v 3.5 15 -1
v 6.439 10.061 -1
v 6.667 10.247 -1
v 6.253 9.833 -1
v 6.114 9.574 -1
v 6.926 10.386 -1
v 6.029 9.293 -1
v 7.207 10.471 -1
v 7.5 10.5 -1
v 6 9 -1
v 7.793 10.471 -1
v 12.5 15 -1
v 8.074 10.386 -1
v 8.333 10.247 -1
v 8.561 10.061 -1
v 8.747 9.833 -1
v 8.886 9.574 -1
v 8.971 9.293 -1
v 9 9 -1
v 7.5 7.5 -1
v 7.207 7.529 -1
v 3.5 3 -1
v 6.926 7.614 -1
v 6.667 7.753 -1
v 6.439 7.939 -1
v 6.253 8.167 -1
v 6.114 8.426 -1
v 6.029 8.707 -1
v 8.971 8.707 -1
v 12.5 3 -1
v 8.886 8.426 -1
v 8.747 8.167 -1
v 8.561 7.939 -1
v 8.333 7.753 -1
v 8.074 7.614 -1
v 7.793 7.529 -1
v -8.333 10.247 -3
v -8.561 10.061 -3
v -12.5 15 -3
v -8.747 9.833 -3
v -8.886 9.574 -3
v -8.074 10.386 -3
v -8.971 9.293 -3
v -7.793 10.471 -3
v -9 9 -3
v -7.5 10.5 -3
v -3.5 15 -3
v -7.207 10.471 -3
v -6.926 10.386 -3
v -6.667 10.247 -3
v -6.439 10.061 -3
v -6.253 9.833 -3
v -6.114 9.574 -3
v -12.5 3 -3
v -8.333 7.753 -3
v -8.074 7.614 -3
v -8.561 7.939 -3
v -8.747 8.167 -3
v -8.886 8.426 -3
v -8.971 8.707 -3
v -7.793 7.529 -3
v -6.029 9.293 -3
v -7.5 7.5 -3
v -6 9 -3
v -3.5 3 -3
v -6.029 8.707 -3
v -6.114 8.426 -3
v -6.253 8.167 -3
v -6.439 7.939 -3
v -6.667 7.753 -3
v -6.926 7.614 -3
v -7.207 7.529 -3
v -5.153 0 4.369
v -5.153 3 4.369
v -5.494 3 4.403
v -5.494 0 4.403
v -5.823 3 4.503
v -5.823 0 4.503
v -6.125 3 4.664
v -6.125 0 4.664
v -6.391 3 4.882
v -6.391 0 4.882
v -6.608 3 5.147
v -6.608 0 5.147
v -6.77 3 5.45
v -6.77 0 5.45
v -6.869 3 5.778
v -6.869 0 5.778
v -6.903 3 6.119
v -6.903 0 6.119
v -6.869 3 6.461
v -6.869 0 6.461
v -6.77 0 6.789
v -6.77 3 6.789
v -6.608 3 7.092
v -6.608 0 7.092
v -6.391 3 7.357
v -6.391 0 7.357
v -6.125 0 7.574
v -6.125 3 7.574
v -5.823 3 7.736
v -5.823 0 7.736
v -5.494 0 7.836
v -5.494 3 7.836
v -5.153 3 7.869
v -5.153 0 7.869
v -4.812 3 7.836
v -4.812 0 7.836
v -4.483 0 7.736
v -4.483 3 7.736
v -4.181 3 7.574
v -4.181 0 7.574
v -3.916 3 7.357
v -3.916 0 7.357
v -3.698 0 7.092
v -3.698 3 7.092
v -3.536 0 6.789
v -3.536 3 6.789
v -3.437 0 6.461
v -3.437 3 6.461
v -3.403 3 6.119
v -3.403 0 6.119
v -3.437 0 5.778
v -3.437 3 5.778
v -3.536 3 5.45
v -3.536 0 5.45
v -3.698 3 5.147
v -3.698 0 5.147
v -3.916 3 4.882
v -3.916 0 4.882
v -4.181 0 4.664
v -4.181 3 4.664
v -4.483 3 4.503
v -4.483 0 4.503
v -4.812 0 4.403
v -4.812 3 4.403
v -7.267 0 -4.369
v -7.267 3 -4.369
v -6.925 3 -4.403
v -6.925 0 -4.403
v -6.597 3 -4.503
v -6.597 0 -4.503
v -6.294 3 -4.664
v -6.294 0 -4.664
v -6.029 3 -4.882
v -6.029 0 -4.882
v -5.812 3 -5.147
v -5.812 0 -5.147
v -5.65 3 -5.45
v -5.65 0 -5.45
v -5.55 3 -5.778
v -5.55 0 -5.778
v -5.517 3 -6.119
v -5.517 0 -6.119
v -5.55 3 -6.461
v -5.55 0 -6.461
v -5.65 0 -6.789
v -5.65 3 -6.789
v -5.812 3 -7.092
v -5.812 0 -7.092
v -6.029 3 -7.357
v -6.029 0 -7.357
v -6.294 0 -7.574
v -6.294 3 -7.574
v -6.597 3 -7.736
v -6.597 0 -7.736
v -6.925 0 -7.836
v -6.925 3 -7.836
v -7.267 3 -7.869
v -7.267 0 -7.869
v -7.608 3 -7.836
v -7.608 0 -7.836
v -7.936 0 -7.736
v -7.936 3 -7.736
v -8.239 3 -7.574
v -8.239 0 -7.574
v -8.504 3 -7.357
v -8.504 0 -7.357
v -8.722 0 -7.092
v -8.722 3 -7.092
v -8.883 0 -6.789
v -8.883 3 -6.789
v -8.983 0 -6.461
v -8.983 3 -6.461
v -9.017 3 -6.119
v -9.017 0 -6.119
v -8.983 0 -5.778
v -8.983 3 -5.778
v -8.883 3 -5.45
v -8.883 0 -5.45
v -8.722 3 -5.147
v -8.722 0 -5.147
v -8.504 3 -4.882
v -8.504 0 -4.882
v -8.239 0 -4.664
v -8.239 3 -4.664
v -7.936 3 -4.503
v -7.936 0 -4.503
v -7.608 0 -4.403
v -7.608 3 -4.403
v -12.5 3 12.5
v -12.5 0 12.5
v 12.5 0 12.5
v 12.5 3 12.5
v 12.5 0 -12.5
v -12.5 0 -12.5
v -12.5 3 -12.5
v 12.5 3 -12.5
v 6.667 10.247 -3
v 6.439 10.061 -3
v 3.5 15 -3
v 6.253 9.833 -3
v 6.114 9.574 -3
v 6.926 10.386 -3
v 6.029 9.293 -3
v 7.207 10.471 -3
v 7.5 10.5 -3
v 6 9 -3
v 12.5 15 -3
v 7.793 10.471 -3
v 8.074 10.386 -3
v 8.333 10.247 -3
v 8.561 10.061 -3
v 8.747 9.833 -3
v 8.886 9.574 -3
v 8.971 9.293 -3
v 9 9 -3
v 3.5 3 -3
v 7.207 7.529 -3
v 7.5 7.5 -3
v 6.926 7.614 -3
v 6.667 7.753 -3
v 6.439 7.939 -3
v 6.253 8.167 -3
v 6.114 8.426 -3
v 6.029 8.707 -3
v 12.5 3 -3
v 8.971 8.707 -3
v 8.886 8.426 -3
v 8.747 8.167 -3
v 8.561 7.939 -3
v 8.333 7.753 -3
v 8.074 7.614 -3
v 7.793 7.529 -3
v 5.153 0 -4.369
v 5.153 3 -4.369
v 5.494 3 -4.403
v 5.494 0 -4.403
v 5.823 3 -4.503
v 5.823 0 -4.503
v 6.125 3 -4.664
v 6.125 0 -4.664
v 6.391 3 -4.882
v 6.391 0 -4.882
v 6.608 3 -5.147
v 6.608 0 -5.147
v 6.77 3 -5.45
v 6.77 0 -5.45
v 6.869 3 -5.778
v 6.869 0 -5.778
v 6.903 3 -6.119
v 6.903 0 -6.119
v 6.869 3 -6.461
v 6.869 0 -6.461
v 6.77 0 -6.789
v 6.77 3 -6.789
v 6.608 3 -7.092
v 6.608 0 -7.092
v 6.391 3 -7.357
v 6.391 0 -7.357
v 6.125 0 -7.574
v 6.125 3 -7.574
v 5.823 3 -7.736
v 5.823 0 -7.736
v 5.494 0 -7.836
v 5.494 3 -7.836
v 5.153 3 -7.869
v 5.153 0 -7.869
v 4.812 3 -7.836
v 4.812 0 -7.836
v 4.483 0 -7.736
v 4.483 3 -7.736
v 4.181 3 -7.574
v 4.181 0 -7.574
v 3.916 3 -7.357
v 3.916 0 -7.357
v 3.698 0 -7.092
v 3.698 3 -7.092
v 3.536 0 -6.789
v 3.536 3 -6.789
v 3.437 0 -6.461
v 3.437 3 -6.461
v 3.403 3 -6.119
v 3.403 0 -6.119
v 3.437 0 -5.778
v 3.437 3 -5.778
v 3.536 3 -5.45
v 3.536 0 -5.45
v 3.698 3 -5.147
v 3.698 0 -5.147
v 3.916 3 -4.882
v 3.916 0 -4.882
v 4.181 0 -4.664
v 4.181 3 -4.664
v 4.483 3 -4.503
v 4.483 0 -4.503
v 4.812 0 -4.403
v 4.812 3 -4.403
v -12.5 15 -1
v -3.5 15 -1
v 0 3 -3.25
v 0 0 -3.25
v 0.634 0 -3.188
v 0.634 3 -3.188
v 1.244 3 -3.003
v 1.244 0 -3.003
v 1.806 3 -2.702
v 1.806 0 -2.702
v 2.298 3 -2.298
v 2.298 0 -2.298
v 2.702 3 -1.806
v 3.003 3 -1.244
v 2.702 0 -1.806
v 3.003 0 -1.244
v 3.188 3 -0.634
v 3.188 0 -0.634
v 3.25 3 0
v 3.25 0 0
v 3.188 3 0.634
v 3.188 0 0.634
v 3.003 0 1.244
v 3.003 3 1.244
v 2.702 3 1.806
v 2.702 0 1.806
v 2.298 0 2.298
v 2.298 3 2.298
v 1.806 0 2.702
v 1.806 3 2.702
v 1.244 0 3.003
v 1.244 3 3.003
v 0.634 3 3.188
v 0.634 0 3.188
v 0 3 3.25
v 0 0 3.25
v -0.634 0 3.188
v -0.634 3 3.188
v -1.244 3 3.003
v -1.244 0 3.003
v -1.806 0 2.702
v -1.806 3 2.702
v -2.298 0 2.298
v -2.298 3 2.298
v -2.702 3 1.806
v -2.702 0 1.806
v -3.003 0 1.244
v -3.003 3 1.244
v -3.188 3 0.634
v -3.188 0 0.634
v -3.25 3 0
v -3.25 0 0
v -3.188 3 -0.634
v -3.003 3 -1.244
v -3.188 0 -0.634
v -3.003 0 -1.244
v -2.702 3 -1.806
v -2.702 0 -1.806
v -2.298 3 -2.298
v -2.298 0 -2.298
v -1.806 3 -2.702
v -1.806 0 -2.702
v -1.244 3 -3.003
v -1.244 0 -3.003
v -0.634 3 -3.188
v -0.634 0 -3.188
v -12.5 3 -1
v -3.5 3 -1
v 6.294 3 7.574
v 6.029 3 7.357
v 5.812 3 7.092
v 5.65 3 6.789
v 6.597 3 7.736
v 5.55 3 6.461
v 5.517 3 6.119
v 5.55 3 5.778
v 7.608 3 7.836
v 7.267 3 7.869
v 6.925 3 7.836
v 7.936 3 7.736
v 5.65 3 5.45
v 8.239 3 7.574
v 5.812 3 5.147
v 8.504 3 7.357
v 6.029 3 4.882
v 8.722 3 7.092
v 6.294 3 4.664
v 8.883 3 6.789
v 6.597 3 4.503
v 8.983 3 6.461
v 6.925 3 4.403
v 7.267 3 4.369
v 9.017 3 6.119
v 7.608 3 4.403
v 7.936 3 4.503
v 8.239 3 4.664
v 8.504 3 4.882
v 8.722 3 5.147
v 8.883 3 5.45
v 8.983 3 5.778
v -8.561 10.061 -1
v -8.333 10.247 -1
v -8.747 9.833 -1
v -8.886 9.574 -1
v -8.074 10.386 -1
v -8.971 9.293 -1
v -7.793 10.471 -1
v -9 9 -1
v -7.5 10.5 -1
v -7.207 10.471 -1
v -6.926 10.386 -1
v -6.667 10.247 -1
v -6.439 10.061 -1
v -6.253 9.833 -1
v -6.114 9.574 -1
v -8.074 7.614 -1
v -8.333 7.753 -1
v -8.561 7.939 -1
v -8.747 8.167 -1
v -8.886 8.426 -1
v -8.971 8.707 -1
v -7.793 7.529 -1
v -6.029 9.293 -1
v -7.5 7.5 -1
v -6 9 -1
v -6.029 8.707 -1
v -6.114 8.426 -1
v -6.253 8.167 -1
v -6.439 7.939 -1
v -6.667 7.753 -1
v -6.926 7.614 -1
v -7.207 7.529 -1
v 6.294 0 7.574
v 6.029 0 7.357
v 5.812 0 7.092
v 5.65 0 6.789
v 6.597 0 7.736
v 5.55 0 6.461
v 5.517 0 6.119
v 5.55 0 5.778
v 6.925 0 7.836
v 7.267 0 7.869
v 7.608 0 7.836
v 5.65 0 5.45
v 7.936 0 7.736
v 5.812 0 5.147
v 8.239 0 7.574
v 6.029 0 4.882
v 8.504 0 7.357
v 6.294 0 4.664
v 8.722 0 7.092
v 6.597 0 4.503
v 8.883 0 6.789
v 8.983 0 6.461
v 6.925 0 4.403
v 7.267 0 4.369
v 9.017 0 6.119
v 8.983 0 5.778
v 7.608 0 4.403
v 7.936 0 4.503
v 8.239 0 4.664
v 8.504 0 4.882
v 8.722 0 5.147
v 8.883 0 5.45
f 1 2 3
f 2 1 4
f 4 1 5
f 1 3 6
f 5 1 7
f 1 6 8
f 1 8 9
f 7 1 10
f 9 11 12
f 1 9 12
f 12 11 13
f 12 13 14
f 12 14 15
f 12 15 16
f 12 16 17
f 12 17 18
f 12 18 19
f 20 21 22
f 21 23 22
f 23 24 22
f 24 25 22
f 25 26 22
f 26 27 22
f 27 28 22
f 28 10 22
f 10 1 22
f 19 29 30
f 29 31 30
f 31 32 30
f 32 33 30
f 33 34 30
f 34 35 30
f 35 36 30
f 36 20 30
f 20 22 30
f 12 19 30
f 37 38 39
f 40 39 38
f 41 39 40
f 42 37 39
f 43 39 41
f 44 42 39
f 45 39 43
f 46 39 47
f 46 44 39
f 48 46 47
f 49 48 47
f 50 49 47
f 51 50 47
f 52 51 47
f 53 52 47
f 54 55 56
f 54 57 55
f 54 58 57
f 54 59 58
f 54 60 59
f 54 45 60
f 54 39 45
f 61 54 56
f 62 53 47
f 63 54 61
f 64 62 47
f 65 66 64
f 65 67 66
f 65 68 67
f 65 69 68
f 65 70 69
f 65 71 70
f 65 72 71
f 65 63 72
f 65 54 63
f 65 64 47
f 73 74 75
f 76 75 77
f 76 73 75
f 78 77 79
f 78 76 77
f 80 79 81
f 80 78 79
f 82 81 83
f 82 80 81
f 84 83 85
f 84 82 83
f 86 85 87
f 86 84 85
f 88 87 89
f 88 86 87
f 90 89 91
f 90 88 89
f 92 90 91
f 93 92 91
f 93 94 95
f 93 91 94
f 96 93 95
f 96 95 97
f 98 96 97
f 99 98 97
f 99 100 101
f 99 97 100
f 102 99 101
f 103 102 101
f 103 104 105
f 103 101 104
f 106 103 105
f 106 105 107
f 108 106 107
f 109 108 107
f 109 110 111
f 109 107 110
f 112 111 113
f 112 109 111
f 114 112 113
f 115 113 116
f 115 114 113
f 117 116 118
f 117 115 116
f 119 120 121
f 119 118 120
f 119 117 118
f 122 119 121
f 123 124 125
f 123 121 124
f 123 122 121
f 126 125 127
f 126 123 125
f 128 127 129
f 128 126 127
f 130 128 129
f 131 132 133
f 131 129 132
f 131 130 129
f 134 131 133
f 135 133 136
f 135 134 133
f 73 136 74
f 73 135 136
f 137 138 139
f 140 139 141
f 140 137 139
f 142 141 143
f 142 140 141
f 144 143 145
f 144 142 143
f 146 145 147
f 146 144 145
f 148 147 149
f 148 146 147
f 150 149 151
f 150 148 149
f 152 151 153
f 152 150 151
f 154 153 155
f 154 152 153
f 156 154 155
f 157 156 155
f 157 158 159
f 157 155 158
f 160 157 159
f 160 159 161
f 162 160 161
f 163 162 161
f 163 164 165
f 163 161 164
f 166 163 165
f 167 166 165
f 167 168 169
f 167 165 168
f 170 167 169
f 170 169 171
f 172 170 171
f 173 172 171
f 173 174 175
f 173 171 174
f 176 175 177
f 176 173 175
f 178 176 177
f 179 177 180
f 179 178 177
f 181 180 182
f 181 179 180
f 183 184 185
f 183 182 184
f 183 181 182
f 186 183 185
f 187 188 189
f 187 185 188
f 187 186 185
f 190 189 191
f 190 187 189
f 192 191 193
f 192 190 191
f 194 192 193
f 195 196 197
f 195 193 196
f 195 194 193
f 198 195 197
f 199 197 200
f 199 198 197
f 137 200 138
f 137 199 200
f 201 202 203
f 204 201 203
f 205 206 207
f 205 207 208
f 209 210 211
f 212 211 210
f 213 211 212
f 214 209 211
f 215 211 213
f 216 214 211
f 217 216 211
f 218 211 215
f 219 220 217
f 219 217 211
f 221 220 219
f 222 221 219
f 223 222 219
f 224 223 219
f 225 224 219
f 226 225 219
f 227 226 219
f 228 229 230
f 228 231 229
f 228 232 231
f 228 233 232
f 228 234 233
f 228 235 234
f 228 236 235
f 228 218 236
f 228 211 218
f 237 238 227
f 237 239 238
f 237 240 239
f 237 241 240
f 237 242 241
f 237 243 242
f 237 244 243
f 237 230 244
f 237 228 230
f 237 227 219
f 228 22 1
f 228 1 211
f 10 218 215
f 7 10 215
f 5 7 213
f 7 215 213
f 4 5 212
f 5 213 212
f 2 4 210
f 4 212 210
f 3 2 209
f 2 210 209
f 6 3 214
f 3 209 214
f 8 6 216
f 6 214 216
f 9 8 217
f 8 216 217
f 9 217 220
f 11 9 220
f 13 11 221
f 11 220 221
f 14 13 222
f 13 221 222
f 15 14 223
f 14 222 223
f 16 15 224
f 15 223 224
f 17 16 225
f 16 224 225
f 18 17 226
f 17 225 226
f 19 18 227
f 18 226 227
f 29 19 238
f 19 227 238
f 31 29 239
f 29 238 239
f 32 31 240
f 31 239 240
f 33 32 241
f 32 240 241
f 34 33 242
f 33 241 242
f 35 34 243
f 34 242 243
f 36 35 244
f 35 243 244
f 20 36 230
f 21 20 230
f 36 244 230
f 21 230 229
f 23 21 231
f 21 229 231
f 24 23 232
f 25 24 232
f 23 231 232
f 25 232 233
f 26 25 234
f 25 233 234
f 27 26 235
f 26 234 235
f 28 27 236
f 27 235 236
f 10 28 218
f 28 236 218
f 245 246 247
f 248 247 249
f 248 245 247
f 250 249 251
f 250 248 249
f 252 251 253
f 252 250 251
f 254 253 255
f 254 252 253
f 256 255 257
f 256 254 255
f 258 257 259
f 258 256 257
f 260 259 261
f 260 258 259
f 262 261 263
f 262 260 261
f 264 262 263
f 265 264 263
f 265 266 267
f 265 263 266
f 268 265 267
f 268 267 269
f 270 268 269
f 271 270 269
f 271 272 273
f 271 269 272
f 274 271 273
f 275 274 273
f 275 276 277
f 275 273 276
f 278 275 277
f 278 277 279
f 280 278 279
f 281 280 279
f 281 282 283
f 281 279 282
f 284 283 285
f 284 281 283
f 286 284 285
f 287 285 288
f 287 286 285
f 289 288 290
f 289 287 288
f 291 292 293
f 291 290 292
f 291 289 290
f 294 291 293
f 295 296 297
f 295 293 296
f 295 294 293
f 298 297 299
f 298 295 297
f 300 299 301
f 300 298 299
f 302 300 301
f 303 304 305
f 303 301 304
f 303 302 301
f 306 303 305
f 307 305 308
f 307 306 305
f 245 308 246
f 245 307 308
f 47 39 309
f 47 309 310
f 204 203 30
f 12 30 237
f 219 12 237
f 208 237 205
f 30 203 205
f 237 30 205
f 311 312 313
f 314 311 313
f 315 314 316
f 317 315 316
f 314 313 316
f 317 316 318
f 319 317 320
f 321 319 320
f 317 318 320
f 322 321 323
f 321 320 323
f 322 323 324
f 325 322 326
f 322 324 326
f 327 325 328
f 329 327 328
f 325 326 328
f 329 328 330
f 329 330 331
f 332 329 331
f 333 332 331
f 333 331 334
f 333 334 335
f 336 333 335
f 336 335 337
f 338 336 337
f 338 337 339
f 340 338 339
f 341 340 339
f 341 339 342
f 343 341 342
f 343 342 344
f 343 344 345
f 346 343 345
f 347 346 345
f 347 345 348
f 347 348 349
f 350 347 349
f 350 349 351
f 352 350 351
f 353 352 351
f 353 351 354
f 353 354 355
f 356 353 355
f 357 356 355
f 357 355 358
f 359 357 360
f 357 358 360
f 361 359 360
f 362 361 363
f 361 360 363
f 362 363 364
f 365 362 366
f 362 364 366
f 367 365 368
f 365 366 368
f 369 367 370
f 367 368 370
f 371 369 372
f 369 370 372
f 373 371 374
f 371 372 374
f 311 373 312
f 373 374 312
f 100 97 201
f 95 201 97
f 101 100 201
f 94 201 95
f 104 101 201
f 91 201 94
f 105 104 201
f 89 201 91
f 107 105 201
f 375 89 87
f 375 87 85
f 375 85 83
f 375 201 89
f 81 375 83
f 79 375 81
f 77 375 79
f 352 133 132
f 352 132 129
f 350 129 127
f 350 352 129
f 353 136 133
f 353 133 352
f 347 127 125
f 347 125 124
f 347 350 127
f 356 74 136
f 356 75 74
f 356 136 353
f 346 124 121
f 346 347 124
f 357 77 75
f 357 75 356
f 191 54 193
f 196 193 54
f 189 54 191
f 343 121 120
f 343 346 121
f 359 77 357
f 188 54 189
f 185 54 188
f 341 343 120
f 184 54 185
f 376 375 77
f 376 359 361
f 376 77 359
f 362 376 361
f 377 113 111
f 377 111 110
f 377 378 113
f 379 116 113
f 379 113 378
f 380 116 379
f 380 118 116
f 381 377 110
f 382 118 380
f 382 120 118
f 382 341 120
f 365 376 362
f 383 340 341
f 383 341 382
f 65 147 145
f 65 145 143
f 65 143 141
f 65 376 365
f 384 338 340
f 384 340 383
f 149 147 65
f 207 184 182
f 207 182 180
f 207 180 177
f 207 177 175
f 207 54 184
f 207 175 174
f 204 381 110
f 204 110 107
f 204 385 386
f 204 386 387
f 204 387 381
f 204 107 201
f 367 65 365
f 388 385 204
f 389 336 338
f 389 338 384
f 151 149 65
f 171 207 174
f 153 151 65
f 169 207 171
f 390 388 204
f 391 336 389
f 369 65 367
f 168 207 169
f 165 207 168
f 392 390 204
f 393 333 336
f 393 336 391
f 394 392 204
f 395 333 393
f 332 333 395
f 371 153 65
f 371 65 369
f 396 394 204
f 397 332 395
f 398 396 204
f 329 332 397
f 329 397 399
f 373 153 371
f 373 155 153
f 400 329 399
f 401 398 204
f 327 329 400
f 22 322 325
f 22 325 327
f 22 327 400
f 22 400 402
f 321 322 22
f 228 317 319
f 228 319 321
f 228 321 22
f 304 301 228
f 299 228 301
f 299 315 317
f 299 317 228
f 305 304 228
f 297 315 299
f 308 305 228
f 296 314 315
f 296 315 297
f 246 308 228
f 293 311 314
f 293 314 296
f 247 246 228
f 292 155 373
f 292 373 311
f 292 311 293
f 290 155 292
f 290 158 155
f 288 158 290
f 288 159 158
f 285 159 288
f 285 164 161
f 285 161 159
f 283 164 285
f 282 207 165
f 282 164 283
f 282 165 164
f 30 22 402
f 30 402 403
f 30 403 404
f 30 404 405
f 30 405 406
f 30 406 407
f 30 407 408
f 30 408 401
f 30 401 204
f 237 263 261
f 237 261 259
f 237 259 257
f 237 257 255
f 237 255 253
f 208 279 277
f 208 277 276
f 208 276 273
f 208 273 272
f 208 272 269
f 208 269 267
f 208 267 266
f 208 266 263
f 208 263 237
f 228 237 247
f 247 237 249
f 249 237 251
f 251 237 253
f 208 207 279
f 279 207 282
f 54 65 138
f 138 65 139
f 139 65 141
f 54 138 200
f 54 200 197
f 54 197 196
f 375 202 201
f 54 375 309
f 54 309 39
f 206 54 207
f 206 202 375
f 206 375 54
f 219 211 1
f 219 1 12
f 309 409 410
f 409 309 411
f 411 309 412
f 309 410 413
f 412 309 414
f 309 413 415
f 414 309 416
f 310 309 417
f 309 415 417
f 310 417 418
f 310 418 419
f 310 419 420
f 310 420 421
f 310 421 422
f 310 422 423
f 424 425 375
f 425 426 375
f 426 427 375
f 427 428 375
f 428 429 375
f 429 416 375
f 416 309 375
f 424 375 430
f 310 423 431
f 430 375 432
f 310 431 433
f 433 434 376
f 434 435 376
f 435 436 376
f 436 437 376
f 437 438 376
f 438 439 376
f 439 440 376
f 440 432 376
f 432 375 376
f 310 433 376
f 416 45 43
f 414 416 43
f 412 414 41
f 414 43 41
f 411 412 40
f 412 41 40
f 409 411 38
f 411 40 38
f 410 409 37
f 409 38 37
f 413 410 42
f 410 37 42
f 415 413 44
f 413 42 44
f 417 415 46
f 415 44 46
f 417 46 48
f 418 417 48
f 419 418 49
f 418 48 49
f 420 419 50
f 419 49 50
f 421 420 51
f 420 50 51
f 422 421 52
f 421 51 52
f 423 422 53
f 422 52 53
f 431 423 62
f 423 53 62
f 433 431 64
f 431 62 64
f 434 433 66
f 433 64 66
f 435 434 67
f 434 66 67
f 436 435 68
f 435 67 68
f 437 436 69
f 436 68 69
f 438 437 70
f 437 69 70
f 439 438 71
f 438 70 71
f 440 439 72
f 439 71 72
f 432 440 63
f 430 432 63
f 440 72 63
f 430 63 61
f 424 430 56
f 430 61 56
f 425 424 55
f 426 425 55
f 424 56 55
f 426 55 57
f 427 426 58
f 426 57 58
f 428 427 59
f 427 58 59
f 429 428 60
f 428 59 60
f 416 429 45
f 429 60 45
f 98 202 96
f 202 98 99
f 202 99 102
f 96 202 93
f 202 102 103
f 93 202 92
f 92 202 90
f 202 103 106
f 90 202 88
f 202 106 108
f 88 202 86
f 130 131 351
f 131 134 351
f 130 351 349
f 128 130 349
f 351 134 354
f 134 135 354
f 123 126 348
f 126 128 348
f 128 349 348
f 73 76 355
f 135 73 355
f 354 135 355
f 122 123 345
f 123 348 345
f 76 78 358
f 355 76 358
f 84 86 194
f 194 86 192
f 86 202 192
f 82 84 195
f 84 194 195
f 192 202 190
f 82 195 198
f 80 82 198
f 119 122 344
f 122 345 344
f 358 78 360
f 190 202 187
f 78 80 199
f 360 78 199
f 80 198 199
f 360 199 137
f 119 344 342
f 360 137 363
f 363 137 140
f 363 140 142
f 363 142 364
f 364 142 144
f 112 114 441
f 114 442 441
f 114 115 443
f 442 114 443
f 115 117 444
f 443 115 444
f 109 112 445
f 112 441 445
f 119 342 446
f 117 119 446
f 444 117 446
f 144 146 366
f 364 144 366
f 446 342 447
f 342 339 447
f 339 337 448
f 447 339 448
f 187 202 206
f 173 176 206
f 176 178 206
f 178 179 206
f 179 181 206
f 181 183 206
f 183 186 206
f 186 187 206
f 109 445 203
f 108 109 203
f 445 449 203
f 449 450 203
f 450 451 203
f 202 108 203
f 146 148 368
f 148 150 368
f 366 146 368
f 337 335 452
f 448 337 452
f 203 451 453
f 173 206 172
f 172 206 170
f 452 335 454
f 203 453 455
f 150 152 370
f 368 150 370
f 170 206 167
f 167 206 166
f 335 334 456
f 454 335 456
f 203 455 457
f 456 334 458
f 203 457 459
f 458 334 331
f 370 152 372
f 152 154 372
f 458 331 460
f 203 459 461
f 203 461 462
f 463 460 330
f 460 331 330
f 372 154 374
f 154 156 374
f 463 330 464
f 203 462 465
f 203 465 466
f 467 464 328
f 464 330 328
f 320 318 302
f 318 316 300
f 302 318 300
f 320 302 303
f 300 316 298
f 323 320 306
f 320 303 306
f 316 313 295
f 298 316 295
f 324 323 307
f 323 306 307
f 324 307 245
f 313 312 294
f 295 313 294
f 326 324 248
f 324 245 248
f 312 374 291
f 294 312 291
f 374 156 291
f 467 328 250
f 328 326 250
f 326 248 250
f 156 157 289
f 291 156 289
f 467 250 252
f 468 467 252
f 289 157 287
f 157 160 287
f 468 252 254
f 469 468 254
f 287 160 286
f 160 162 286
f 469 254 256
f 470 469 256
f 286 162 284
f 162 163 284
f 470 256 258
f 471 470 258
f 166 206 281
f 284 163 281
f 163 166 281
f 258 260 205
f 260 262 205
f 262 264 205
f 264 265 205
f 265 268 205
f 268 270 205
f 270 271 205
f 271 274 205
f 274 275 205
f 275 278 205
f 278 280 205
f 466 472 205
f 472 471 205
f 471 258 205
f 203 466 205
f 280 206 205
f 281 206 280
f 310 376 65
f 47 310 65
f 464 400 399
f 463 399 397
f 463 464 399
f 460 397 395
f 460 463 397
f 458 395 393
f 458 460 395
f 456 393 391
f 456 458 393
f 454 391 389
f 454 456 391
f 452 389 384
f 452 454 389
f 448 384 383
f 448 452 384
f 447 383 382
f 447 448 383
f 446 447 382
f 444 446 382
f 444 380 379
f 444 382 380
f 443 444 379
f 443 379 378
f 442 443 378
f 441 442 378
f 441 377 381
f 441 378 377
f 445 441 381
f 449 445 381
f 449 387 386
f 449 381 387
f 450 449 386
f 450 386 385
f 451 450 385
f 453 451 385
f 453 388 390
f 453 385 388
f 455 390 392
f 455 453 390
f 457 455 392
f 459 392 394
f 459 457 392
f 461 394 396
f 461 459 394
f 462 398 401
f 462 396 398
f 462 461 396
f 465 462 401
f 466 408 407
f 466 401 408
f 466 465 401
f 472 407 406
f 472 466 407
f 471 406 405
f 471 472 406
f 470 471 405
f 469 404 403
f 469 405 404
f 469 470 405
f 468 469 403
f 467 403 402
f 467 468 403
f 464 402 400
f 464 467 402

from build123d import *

# Parameters (mm, degrees)
SKETCH4_W           = 25
SKETCH4_H           = 25
BOSS_EXTRUDE2_DEPTH = 3
SKETCH1_R           = 1.75
CUT_EXTRUDE3_DEPTH  = 18.930421077
SKETCH5_W           = 9
SKETCH5_H           = 2
BOSS_EXTRUDE3_DEPTH = 12
SKETCH6_R           = 3.25
CUT_EXTRUDE4_DEPTH  = 24.184046239
SKETCH7_R           = 1.5
CUT_EXTRUDE5_DEPTH  = 2


with BuildPart() as part:
    # Sketch4 → Boss-Extrude2 (new body)
    with BuildSketch(Plane(origin=(0, 0, 0), x_dir=(1, 0, 0), z_dir=(0, 1, 0))):
        Rectangle(SKETCH4_W, SKETCH4_H)
    extrude(amount=BOSS_EXTRUDE2_DEPTH)

    # Sketch1 → Cut-Extrude3 (cut, through all)
    with BuildSketch(Plane(origin=(0, 0, 0), x_dir=(1, 0, 0), z_dir=(0, 1, 0))):
        with Locations(Location((-7.266656382, 6.119289585, 0), (0, 0, 270))):
            Circle(SKETCH1_R)
        with Locations(Location((5.153085966, 6.119289585, 0), (0, 0, 270))):
            Circle(SKETCH1_R)
        with Locations(Location((-5.153085966, -6.119289585, 0), (0, 0, 90))):
            Circle(SKETCH1_R)
        with Locations(Location((7.266656382, -6.119289585, 0), (0, 0, 90))):
            Circle(SKETCH1_R)
    extrude(amount=CUT_EXTRUDE3_DEPTH, mode=Mode.SUBTRACT)

    # Sketch5 → Boss-Extrude3 (add)
    with BuildSketch(Plane(origin=(0, 3, 0), x_dir=(1, 0, 0), z_dir=(0, 1, 0))):
        with Locations((8, 2)):
            Rectangle(SKETCH5_W, SKETCH5_H)
        with Locations((-8, 2)):
            Rectangle(SKETCH5_W, SKETCH5_H)
    extrude(amount=BOSS_EXTRUDE3_DEPTH)

    # Sketch6 → Cut-Extrude4 (cut, through all)
    with BuildSketch(Plane.XZ):
        with Locations(Location((0, 0, 0), (0, 0, 270))):
            Circle(SKETCH6_R)
    extrude(amount=-CUT_EXTRUDE4_DEPTH, mode=Mode.SUBTRACT)

    # Sketch7 → Cut-Extrude5 (cut)
    with BuildSketch(Plane(origin=(0, 0, -3), x_dir=(-1, 0, 0), z_dir=(0, 0, -1))):
        with Locations((-7.5, 9)):
            Circle(SKETCH7_R)
        with Locations((7.5, 9)):
            Circle(SKETCH7_R)
    extrude(amount=-CUT_EXTRUDE5_DEPTH, mode=Mode.SUBTRACT)


solid = part.part
